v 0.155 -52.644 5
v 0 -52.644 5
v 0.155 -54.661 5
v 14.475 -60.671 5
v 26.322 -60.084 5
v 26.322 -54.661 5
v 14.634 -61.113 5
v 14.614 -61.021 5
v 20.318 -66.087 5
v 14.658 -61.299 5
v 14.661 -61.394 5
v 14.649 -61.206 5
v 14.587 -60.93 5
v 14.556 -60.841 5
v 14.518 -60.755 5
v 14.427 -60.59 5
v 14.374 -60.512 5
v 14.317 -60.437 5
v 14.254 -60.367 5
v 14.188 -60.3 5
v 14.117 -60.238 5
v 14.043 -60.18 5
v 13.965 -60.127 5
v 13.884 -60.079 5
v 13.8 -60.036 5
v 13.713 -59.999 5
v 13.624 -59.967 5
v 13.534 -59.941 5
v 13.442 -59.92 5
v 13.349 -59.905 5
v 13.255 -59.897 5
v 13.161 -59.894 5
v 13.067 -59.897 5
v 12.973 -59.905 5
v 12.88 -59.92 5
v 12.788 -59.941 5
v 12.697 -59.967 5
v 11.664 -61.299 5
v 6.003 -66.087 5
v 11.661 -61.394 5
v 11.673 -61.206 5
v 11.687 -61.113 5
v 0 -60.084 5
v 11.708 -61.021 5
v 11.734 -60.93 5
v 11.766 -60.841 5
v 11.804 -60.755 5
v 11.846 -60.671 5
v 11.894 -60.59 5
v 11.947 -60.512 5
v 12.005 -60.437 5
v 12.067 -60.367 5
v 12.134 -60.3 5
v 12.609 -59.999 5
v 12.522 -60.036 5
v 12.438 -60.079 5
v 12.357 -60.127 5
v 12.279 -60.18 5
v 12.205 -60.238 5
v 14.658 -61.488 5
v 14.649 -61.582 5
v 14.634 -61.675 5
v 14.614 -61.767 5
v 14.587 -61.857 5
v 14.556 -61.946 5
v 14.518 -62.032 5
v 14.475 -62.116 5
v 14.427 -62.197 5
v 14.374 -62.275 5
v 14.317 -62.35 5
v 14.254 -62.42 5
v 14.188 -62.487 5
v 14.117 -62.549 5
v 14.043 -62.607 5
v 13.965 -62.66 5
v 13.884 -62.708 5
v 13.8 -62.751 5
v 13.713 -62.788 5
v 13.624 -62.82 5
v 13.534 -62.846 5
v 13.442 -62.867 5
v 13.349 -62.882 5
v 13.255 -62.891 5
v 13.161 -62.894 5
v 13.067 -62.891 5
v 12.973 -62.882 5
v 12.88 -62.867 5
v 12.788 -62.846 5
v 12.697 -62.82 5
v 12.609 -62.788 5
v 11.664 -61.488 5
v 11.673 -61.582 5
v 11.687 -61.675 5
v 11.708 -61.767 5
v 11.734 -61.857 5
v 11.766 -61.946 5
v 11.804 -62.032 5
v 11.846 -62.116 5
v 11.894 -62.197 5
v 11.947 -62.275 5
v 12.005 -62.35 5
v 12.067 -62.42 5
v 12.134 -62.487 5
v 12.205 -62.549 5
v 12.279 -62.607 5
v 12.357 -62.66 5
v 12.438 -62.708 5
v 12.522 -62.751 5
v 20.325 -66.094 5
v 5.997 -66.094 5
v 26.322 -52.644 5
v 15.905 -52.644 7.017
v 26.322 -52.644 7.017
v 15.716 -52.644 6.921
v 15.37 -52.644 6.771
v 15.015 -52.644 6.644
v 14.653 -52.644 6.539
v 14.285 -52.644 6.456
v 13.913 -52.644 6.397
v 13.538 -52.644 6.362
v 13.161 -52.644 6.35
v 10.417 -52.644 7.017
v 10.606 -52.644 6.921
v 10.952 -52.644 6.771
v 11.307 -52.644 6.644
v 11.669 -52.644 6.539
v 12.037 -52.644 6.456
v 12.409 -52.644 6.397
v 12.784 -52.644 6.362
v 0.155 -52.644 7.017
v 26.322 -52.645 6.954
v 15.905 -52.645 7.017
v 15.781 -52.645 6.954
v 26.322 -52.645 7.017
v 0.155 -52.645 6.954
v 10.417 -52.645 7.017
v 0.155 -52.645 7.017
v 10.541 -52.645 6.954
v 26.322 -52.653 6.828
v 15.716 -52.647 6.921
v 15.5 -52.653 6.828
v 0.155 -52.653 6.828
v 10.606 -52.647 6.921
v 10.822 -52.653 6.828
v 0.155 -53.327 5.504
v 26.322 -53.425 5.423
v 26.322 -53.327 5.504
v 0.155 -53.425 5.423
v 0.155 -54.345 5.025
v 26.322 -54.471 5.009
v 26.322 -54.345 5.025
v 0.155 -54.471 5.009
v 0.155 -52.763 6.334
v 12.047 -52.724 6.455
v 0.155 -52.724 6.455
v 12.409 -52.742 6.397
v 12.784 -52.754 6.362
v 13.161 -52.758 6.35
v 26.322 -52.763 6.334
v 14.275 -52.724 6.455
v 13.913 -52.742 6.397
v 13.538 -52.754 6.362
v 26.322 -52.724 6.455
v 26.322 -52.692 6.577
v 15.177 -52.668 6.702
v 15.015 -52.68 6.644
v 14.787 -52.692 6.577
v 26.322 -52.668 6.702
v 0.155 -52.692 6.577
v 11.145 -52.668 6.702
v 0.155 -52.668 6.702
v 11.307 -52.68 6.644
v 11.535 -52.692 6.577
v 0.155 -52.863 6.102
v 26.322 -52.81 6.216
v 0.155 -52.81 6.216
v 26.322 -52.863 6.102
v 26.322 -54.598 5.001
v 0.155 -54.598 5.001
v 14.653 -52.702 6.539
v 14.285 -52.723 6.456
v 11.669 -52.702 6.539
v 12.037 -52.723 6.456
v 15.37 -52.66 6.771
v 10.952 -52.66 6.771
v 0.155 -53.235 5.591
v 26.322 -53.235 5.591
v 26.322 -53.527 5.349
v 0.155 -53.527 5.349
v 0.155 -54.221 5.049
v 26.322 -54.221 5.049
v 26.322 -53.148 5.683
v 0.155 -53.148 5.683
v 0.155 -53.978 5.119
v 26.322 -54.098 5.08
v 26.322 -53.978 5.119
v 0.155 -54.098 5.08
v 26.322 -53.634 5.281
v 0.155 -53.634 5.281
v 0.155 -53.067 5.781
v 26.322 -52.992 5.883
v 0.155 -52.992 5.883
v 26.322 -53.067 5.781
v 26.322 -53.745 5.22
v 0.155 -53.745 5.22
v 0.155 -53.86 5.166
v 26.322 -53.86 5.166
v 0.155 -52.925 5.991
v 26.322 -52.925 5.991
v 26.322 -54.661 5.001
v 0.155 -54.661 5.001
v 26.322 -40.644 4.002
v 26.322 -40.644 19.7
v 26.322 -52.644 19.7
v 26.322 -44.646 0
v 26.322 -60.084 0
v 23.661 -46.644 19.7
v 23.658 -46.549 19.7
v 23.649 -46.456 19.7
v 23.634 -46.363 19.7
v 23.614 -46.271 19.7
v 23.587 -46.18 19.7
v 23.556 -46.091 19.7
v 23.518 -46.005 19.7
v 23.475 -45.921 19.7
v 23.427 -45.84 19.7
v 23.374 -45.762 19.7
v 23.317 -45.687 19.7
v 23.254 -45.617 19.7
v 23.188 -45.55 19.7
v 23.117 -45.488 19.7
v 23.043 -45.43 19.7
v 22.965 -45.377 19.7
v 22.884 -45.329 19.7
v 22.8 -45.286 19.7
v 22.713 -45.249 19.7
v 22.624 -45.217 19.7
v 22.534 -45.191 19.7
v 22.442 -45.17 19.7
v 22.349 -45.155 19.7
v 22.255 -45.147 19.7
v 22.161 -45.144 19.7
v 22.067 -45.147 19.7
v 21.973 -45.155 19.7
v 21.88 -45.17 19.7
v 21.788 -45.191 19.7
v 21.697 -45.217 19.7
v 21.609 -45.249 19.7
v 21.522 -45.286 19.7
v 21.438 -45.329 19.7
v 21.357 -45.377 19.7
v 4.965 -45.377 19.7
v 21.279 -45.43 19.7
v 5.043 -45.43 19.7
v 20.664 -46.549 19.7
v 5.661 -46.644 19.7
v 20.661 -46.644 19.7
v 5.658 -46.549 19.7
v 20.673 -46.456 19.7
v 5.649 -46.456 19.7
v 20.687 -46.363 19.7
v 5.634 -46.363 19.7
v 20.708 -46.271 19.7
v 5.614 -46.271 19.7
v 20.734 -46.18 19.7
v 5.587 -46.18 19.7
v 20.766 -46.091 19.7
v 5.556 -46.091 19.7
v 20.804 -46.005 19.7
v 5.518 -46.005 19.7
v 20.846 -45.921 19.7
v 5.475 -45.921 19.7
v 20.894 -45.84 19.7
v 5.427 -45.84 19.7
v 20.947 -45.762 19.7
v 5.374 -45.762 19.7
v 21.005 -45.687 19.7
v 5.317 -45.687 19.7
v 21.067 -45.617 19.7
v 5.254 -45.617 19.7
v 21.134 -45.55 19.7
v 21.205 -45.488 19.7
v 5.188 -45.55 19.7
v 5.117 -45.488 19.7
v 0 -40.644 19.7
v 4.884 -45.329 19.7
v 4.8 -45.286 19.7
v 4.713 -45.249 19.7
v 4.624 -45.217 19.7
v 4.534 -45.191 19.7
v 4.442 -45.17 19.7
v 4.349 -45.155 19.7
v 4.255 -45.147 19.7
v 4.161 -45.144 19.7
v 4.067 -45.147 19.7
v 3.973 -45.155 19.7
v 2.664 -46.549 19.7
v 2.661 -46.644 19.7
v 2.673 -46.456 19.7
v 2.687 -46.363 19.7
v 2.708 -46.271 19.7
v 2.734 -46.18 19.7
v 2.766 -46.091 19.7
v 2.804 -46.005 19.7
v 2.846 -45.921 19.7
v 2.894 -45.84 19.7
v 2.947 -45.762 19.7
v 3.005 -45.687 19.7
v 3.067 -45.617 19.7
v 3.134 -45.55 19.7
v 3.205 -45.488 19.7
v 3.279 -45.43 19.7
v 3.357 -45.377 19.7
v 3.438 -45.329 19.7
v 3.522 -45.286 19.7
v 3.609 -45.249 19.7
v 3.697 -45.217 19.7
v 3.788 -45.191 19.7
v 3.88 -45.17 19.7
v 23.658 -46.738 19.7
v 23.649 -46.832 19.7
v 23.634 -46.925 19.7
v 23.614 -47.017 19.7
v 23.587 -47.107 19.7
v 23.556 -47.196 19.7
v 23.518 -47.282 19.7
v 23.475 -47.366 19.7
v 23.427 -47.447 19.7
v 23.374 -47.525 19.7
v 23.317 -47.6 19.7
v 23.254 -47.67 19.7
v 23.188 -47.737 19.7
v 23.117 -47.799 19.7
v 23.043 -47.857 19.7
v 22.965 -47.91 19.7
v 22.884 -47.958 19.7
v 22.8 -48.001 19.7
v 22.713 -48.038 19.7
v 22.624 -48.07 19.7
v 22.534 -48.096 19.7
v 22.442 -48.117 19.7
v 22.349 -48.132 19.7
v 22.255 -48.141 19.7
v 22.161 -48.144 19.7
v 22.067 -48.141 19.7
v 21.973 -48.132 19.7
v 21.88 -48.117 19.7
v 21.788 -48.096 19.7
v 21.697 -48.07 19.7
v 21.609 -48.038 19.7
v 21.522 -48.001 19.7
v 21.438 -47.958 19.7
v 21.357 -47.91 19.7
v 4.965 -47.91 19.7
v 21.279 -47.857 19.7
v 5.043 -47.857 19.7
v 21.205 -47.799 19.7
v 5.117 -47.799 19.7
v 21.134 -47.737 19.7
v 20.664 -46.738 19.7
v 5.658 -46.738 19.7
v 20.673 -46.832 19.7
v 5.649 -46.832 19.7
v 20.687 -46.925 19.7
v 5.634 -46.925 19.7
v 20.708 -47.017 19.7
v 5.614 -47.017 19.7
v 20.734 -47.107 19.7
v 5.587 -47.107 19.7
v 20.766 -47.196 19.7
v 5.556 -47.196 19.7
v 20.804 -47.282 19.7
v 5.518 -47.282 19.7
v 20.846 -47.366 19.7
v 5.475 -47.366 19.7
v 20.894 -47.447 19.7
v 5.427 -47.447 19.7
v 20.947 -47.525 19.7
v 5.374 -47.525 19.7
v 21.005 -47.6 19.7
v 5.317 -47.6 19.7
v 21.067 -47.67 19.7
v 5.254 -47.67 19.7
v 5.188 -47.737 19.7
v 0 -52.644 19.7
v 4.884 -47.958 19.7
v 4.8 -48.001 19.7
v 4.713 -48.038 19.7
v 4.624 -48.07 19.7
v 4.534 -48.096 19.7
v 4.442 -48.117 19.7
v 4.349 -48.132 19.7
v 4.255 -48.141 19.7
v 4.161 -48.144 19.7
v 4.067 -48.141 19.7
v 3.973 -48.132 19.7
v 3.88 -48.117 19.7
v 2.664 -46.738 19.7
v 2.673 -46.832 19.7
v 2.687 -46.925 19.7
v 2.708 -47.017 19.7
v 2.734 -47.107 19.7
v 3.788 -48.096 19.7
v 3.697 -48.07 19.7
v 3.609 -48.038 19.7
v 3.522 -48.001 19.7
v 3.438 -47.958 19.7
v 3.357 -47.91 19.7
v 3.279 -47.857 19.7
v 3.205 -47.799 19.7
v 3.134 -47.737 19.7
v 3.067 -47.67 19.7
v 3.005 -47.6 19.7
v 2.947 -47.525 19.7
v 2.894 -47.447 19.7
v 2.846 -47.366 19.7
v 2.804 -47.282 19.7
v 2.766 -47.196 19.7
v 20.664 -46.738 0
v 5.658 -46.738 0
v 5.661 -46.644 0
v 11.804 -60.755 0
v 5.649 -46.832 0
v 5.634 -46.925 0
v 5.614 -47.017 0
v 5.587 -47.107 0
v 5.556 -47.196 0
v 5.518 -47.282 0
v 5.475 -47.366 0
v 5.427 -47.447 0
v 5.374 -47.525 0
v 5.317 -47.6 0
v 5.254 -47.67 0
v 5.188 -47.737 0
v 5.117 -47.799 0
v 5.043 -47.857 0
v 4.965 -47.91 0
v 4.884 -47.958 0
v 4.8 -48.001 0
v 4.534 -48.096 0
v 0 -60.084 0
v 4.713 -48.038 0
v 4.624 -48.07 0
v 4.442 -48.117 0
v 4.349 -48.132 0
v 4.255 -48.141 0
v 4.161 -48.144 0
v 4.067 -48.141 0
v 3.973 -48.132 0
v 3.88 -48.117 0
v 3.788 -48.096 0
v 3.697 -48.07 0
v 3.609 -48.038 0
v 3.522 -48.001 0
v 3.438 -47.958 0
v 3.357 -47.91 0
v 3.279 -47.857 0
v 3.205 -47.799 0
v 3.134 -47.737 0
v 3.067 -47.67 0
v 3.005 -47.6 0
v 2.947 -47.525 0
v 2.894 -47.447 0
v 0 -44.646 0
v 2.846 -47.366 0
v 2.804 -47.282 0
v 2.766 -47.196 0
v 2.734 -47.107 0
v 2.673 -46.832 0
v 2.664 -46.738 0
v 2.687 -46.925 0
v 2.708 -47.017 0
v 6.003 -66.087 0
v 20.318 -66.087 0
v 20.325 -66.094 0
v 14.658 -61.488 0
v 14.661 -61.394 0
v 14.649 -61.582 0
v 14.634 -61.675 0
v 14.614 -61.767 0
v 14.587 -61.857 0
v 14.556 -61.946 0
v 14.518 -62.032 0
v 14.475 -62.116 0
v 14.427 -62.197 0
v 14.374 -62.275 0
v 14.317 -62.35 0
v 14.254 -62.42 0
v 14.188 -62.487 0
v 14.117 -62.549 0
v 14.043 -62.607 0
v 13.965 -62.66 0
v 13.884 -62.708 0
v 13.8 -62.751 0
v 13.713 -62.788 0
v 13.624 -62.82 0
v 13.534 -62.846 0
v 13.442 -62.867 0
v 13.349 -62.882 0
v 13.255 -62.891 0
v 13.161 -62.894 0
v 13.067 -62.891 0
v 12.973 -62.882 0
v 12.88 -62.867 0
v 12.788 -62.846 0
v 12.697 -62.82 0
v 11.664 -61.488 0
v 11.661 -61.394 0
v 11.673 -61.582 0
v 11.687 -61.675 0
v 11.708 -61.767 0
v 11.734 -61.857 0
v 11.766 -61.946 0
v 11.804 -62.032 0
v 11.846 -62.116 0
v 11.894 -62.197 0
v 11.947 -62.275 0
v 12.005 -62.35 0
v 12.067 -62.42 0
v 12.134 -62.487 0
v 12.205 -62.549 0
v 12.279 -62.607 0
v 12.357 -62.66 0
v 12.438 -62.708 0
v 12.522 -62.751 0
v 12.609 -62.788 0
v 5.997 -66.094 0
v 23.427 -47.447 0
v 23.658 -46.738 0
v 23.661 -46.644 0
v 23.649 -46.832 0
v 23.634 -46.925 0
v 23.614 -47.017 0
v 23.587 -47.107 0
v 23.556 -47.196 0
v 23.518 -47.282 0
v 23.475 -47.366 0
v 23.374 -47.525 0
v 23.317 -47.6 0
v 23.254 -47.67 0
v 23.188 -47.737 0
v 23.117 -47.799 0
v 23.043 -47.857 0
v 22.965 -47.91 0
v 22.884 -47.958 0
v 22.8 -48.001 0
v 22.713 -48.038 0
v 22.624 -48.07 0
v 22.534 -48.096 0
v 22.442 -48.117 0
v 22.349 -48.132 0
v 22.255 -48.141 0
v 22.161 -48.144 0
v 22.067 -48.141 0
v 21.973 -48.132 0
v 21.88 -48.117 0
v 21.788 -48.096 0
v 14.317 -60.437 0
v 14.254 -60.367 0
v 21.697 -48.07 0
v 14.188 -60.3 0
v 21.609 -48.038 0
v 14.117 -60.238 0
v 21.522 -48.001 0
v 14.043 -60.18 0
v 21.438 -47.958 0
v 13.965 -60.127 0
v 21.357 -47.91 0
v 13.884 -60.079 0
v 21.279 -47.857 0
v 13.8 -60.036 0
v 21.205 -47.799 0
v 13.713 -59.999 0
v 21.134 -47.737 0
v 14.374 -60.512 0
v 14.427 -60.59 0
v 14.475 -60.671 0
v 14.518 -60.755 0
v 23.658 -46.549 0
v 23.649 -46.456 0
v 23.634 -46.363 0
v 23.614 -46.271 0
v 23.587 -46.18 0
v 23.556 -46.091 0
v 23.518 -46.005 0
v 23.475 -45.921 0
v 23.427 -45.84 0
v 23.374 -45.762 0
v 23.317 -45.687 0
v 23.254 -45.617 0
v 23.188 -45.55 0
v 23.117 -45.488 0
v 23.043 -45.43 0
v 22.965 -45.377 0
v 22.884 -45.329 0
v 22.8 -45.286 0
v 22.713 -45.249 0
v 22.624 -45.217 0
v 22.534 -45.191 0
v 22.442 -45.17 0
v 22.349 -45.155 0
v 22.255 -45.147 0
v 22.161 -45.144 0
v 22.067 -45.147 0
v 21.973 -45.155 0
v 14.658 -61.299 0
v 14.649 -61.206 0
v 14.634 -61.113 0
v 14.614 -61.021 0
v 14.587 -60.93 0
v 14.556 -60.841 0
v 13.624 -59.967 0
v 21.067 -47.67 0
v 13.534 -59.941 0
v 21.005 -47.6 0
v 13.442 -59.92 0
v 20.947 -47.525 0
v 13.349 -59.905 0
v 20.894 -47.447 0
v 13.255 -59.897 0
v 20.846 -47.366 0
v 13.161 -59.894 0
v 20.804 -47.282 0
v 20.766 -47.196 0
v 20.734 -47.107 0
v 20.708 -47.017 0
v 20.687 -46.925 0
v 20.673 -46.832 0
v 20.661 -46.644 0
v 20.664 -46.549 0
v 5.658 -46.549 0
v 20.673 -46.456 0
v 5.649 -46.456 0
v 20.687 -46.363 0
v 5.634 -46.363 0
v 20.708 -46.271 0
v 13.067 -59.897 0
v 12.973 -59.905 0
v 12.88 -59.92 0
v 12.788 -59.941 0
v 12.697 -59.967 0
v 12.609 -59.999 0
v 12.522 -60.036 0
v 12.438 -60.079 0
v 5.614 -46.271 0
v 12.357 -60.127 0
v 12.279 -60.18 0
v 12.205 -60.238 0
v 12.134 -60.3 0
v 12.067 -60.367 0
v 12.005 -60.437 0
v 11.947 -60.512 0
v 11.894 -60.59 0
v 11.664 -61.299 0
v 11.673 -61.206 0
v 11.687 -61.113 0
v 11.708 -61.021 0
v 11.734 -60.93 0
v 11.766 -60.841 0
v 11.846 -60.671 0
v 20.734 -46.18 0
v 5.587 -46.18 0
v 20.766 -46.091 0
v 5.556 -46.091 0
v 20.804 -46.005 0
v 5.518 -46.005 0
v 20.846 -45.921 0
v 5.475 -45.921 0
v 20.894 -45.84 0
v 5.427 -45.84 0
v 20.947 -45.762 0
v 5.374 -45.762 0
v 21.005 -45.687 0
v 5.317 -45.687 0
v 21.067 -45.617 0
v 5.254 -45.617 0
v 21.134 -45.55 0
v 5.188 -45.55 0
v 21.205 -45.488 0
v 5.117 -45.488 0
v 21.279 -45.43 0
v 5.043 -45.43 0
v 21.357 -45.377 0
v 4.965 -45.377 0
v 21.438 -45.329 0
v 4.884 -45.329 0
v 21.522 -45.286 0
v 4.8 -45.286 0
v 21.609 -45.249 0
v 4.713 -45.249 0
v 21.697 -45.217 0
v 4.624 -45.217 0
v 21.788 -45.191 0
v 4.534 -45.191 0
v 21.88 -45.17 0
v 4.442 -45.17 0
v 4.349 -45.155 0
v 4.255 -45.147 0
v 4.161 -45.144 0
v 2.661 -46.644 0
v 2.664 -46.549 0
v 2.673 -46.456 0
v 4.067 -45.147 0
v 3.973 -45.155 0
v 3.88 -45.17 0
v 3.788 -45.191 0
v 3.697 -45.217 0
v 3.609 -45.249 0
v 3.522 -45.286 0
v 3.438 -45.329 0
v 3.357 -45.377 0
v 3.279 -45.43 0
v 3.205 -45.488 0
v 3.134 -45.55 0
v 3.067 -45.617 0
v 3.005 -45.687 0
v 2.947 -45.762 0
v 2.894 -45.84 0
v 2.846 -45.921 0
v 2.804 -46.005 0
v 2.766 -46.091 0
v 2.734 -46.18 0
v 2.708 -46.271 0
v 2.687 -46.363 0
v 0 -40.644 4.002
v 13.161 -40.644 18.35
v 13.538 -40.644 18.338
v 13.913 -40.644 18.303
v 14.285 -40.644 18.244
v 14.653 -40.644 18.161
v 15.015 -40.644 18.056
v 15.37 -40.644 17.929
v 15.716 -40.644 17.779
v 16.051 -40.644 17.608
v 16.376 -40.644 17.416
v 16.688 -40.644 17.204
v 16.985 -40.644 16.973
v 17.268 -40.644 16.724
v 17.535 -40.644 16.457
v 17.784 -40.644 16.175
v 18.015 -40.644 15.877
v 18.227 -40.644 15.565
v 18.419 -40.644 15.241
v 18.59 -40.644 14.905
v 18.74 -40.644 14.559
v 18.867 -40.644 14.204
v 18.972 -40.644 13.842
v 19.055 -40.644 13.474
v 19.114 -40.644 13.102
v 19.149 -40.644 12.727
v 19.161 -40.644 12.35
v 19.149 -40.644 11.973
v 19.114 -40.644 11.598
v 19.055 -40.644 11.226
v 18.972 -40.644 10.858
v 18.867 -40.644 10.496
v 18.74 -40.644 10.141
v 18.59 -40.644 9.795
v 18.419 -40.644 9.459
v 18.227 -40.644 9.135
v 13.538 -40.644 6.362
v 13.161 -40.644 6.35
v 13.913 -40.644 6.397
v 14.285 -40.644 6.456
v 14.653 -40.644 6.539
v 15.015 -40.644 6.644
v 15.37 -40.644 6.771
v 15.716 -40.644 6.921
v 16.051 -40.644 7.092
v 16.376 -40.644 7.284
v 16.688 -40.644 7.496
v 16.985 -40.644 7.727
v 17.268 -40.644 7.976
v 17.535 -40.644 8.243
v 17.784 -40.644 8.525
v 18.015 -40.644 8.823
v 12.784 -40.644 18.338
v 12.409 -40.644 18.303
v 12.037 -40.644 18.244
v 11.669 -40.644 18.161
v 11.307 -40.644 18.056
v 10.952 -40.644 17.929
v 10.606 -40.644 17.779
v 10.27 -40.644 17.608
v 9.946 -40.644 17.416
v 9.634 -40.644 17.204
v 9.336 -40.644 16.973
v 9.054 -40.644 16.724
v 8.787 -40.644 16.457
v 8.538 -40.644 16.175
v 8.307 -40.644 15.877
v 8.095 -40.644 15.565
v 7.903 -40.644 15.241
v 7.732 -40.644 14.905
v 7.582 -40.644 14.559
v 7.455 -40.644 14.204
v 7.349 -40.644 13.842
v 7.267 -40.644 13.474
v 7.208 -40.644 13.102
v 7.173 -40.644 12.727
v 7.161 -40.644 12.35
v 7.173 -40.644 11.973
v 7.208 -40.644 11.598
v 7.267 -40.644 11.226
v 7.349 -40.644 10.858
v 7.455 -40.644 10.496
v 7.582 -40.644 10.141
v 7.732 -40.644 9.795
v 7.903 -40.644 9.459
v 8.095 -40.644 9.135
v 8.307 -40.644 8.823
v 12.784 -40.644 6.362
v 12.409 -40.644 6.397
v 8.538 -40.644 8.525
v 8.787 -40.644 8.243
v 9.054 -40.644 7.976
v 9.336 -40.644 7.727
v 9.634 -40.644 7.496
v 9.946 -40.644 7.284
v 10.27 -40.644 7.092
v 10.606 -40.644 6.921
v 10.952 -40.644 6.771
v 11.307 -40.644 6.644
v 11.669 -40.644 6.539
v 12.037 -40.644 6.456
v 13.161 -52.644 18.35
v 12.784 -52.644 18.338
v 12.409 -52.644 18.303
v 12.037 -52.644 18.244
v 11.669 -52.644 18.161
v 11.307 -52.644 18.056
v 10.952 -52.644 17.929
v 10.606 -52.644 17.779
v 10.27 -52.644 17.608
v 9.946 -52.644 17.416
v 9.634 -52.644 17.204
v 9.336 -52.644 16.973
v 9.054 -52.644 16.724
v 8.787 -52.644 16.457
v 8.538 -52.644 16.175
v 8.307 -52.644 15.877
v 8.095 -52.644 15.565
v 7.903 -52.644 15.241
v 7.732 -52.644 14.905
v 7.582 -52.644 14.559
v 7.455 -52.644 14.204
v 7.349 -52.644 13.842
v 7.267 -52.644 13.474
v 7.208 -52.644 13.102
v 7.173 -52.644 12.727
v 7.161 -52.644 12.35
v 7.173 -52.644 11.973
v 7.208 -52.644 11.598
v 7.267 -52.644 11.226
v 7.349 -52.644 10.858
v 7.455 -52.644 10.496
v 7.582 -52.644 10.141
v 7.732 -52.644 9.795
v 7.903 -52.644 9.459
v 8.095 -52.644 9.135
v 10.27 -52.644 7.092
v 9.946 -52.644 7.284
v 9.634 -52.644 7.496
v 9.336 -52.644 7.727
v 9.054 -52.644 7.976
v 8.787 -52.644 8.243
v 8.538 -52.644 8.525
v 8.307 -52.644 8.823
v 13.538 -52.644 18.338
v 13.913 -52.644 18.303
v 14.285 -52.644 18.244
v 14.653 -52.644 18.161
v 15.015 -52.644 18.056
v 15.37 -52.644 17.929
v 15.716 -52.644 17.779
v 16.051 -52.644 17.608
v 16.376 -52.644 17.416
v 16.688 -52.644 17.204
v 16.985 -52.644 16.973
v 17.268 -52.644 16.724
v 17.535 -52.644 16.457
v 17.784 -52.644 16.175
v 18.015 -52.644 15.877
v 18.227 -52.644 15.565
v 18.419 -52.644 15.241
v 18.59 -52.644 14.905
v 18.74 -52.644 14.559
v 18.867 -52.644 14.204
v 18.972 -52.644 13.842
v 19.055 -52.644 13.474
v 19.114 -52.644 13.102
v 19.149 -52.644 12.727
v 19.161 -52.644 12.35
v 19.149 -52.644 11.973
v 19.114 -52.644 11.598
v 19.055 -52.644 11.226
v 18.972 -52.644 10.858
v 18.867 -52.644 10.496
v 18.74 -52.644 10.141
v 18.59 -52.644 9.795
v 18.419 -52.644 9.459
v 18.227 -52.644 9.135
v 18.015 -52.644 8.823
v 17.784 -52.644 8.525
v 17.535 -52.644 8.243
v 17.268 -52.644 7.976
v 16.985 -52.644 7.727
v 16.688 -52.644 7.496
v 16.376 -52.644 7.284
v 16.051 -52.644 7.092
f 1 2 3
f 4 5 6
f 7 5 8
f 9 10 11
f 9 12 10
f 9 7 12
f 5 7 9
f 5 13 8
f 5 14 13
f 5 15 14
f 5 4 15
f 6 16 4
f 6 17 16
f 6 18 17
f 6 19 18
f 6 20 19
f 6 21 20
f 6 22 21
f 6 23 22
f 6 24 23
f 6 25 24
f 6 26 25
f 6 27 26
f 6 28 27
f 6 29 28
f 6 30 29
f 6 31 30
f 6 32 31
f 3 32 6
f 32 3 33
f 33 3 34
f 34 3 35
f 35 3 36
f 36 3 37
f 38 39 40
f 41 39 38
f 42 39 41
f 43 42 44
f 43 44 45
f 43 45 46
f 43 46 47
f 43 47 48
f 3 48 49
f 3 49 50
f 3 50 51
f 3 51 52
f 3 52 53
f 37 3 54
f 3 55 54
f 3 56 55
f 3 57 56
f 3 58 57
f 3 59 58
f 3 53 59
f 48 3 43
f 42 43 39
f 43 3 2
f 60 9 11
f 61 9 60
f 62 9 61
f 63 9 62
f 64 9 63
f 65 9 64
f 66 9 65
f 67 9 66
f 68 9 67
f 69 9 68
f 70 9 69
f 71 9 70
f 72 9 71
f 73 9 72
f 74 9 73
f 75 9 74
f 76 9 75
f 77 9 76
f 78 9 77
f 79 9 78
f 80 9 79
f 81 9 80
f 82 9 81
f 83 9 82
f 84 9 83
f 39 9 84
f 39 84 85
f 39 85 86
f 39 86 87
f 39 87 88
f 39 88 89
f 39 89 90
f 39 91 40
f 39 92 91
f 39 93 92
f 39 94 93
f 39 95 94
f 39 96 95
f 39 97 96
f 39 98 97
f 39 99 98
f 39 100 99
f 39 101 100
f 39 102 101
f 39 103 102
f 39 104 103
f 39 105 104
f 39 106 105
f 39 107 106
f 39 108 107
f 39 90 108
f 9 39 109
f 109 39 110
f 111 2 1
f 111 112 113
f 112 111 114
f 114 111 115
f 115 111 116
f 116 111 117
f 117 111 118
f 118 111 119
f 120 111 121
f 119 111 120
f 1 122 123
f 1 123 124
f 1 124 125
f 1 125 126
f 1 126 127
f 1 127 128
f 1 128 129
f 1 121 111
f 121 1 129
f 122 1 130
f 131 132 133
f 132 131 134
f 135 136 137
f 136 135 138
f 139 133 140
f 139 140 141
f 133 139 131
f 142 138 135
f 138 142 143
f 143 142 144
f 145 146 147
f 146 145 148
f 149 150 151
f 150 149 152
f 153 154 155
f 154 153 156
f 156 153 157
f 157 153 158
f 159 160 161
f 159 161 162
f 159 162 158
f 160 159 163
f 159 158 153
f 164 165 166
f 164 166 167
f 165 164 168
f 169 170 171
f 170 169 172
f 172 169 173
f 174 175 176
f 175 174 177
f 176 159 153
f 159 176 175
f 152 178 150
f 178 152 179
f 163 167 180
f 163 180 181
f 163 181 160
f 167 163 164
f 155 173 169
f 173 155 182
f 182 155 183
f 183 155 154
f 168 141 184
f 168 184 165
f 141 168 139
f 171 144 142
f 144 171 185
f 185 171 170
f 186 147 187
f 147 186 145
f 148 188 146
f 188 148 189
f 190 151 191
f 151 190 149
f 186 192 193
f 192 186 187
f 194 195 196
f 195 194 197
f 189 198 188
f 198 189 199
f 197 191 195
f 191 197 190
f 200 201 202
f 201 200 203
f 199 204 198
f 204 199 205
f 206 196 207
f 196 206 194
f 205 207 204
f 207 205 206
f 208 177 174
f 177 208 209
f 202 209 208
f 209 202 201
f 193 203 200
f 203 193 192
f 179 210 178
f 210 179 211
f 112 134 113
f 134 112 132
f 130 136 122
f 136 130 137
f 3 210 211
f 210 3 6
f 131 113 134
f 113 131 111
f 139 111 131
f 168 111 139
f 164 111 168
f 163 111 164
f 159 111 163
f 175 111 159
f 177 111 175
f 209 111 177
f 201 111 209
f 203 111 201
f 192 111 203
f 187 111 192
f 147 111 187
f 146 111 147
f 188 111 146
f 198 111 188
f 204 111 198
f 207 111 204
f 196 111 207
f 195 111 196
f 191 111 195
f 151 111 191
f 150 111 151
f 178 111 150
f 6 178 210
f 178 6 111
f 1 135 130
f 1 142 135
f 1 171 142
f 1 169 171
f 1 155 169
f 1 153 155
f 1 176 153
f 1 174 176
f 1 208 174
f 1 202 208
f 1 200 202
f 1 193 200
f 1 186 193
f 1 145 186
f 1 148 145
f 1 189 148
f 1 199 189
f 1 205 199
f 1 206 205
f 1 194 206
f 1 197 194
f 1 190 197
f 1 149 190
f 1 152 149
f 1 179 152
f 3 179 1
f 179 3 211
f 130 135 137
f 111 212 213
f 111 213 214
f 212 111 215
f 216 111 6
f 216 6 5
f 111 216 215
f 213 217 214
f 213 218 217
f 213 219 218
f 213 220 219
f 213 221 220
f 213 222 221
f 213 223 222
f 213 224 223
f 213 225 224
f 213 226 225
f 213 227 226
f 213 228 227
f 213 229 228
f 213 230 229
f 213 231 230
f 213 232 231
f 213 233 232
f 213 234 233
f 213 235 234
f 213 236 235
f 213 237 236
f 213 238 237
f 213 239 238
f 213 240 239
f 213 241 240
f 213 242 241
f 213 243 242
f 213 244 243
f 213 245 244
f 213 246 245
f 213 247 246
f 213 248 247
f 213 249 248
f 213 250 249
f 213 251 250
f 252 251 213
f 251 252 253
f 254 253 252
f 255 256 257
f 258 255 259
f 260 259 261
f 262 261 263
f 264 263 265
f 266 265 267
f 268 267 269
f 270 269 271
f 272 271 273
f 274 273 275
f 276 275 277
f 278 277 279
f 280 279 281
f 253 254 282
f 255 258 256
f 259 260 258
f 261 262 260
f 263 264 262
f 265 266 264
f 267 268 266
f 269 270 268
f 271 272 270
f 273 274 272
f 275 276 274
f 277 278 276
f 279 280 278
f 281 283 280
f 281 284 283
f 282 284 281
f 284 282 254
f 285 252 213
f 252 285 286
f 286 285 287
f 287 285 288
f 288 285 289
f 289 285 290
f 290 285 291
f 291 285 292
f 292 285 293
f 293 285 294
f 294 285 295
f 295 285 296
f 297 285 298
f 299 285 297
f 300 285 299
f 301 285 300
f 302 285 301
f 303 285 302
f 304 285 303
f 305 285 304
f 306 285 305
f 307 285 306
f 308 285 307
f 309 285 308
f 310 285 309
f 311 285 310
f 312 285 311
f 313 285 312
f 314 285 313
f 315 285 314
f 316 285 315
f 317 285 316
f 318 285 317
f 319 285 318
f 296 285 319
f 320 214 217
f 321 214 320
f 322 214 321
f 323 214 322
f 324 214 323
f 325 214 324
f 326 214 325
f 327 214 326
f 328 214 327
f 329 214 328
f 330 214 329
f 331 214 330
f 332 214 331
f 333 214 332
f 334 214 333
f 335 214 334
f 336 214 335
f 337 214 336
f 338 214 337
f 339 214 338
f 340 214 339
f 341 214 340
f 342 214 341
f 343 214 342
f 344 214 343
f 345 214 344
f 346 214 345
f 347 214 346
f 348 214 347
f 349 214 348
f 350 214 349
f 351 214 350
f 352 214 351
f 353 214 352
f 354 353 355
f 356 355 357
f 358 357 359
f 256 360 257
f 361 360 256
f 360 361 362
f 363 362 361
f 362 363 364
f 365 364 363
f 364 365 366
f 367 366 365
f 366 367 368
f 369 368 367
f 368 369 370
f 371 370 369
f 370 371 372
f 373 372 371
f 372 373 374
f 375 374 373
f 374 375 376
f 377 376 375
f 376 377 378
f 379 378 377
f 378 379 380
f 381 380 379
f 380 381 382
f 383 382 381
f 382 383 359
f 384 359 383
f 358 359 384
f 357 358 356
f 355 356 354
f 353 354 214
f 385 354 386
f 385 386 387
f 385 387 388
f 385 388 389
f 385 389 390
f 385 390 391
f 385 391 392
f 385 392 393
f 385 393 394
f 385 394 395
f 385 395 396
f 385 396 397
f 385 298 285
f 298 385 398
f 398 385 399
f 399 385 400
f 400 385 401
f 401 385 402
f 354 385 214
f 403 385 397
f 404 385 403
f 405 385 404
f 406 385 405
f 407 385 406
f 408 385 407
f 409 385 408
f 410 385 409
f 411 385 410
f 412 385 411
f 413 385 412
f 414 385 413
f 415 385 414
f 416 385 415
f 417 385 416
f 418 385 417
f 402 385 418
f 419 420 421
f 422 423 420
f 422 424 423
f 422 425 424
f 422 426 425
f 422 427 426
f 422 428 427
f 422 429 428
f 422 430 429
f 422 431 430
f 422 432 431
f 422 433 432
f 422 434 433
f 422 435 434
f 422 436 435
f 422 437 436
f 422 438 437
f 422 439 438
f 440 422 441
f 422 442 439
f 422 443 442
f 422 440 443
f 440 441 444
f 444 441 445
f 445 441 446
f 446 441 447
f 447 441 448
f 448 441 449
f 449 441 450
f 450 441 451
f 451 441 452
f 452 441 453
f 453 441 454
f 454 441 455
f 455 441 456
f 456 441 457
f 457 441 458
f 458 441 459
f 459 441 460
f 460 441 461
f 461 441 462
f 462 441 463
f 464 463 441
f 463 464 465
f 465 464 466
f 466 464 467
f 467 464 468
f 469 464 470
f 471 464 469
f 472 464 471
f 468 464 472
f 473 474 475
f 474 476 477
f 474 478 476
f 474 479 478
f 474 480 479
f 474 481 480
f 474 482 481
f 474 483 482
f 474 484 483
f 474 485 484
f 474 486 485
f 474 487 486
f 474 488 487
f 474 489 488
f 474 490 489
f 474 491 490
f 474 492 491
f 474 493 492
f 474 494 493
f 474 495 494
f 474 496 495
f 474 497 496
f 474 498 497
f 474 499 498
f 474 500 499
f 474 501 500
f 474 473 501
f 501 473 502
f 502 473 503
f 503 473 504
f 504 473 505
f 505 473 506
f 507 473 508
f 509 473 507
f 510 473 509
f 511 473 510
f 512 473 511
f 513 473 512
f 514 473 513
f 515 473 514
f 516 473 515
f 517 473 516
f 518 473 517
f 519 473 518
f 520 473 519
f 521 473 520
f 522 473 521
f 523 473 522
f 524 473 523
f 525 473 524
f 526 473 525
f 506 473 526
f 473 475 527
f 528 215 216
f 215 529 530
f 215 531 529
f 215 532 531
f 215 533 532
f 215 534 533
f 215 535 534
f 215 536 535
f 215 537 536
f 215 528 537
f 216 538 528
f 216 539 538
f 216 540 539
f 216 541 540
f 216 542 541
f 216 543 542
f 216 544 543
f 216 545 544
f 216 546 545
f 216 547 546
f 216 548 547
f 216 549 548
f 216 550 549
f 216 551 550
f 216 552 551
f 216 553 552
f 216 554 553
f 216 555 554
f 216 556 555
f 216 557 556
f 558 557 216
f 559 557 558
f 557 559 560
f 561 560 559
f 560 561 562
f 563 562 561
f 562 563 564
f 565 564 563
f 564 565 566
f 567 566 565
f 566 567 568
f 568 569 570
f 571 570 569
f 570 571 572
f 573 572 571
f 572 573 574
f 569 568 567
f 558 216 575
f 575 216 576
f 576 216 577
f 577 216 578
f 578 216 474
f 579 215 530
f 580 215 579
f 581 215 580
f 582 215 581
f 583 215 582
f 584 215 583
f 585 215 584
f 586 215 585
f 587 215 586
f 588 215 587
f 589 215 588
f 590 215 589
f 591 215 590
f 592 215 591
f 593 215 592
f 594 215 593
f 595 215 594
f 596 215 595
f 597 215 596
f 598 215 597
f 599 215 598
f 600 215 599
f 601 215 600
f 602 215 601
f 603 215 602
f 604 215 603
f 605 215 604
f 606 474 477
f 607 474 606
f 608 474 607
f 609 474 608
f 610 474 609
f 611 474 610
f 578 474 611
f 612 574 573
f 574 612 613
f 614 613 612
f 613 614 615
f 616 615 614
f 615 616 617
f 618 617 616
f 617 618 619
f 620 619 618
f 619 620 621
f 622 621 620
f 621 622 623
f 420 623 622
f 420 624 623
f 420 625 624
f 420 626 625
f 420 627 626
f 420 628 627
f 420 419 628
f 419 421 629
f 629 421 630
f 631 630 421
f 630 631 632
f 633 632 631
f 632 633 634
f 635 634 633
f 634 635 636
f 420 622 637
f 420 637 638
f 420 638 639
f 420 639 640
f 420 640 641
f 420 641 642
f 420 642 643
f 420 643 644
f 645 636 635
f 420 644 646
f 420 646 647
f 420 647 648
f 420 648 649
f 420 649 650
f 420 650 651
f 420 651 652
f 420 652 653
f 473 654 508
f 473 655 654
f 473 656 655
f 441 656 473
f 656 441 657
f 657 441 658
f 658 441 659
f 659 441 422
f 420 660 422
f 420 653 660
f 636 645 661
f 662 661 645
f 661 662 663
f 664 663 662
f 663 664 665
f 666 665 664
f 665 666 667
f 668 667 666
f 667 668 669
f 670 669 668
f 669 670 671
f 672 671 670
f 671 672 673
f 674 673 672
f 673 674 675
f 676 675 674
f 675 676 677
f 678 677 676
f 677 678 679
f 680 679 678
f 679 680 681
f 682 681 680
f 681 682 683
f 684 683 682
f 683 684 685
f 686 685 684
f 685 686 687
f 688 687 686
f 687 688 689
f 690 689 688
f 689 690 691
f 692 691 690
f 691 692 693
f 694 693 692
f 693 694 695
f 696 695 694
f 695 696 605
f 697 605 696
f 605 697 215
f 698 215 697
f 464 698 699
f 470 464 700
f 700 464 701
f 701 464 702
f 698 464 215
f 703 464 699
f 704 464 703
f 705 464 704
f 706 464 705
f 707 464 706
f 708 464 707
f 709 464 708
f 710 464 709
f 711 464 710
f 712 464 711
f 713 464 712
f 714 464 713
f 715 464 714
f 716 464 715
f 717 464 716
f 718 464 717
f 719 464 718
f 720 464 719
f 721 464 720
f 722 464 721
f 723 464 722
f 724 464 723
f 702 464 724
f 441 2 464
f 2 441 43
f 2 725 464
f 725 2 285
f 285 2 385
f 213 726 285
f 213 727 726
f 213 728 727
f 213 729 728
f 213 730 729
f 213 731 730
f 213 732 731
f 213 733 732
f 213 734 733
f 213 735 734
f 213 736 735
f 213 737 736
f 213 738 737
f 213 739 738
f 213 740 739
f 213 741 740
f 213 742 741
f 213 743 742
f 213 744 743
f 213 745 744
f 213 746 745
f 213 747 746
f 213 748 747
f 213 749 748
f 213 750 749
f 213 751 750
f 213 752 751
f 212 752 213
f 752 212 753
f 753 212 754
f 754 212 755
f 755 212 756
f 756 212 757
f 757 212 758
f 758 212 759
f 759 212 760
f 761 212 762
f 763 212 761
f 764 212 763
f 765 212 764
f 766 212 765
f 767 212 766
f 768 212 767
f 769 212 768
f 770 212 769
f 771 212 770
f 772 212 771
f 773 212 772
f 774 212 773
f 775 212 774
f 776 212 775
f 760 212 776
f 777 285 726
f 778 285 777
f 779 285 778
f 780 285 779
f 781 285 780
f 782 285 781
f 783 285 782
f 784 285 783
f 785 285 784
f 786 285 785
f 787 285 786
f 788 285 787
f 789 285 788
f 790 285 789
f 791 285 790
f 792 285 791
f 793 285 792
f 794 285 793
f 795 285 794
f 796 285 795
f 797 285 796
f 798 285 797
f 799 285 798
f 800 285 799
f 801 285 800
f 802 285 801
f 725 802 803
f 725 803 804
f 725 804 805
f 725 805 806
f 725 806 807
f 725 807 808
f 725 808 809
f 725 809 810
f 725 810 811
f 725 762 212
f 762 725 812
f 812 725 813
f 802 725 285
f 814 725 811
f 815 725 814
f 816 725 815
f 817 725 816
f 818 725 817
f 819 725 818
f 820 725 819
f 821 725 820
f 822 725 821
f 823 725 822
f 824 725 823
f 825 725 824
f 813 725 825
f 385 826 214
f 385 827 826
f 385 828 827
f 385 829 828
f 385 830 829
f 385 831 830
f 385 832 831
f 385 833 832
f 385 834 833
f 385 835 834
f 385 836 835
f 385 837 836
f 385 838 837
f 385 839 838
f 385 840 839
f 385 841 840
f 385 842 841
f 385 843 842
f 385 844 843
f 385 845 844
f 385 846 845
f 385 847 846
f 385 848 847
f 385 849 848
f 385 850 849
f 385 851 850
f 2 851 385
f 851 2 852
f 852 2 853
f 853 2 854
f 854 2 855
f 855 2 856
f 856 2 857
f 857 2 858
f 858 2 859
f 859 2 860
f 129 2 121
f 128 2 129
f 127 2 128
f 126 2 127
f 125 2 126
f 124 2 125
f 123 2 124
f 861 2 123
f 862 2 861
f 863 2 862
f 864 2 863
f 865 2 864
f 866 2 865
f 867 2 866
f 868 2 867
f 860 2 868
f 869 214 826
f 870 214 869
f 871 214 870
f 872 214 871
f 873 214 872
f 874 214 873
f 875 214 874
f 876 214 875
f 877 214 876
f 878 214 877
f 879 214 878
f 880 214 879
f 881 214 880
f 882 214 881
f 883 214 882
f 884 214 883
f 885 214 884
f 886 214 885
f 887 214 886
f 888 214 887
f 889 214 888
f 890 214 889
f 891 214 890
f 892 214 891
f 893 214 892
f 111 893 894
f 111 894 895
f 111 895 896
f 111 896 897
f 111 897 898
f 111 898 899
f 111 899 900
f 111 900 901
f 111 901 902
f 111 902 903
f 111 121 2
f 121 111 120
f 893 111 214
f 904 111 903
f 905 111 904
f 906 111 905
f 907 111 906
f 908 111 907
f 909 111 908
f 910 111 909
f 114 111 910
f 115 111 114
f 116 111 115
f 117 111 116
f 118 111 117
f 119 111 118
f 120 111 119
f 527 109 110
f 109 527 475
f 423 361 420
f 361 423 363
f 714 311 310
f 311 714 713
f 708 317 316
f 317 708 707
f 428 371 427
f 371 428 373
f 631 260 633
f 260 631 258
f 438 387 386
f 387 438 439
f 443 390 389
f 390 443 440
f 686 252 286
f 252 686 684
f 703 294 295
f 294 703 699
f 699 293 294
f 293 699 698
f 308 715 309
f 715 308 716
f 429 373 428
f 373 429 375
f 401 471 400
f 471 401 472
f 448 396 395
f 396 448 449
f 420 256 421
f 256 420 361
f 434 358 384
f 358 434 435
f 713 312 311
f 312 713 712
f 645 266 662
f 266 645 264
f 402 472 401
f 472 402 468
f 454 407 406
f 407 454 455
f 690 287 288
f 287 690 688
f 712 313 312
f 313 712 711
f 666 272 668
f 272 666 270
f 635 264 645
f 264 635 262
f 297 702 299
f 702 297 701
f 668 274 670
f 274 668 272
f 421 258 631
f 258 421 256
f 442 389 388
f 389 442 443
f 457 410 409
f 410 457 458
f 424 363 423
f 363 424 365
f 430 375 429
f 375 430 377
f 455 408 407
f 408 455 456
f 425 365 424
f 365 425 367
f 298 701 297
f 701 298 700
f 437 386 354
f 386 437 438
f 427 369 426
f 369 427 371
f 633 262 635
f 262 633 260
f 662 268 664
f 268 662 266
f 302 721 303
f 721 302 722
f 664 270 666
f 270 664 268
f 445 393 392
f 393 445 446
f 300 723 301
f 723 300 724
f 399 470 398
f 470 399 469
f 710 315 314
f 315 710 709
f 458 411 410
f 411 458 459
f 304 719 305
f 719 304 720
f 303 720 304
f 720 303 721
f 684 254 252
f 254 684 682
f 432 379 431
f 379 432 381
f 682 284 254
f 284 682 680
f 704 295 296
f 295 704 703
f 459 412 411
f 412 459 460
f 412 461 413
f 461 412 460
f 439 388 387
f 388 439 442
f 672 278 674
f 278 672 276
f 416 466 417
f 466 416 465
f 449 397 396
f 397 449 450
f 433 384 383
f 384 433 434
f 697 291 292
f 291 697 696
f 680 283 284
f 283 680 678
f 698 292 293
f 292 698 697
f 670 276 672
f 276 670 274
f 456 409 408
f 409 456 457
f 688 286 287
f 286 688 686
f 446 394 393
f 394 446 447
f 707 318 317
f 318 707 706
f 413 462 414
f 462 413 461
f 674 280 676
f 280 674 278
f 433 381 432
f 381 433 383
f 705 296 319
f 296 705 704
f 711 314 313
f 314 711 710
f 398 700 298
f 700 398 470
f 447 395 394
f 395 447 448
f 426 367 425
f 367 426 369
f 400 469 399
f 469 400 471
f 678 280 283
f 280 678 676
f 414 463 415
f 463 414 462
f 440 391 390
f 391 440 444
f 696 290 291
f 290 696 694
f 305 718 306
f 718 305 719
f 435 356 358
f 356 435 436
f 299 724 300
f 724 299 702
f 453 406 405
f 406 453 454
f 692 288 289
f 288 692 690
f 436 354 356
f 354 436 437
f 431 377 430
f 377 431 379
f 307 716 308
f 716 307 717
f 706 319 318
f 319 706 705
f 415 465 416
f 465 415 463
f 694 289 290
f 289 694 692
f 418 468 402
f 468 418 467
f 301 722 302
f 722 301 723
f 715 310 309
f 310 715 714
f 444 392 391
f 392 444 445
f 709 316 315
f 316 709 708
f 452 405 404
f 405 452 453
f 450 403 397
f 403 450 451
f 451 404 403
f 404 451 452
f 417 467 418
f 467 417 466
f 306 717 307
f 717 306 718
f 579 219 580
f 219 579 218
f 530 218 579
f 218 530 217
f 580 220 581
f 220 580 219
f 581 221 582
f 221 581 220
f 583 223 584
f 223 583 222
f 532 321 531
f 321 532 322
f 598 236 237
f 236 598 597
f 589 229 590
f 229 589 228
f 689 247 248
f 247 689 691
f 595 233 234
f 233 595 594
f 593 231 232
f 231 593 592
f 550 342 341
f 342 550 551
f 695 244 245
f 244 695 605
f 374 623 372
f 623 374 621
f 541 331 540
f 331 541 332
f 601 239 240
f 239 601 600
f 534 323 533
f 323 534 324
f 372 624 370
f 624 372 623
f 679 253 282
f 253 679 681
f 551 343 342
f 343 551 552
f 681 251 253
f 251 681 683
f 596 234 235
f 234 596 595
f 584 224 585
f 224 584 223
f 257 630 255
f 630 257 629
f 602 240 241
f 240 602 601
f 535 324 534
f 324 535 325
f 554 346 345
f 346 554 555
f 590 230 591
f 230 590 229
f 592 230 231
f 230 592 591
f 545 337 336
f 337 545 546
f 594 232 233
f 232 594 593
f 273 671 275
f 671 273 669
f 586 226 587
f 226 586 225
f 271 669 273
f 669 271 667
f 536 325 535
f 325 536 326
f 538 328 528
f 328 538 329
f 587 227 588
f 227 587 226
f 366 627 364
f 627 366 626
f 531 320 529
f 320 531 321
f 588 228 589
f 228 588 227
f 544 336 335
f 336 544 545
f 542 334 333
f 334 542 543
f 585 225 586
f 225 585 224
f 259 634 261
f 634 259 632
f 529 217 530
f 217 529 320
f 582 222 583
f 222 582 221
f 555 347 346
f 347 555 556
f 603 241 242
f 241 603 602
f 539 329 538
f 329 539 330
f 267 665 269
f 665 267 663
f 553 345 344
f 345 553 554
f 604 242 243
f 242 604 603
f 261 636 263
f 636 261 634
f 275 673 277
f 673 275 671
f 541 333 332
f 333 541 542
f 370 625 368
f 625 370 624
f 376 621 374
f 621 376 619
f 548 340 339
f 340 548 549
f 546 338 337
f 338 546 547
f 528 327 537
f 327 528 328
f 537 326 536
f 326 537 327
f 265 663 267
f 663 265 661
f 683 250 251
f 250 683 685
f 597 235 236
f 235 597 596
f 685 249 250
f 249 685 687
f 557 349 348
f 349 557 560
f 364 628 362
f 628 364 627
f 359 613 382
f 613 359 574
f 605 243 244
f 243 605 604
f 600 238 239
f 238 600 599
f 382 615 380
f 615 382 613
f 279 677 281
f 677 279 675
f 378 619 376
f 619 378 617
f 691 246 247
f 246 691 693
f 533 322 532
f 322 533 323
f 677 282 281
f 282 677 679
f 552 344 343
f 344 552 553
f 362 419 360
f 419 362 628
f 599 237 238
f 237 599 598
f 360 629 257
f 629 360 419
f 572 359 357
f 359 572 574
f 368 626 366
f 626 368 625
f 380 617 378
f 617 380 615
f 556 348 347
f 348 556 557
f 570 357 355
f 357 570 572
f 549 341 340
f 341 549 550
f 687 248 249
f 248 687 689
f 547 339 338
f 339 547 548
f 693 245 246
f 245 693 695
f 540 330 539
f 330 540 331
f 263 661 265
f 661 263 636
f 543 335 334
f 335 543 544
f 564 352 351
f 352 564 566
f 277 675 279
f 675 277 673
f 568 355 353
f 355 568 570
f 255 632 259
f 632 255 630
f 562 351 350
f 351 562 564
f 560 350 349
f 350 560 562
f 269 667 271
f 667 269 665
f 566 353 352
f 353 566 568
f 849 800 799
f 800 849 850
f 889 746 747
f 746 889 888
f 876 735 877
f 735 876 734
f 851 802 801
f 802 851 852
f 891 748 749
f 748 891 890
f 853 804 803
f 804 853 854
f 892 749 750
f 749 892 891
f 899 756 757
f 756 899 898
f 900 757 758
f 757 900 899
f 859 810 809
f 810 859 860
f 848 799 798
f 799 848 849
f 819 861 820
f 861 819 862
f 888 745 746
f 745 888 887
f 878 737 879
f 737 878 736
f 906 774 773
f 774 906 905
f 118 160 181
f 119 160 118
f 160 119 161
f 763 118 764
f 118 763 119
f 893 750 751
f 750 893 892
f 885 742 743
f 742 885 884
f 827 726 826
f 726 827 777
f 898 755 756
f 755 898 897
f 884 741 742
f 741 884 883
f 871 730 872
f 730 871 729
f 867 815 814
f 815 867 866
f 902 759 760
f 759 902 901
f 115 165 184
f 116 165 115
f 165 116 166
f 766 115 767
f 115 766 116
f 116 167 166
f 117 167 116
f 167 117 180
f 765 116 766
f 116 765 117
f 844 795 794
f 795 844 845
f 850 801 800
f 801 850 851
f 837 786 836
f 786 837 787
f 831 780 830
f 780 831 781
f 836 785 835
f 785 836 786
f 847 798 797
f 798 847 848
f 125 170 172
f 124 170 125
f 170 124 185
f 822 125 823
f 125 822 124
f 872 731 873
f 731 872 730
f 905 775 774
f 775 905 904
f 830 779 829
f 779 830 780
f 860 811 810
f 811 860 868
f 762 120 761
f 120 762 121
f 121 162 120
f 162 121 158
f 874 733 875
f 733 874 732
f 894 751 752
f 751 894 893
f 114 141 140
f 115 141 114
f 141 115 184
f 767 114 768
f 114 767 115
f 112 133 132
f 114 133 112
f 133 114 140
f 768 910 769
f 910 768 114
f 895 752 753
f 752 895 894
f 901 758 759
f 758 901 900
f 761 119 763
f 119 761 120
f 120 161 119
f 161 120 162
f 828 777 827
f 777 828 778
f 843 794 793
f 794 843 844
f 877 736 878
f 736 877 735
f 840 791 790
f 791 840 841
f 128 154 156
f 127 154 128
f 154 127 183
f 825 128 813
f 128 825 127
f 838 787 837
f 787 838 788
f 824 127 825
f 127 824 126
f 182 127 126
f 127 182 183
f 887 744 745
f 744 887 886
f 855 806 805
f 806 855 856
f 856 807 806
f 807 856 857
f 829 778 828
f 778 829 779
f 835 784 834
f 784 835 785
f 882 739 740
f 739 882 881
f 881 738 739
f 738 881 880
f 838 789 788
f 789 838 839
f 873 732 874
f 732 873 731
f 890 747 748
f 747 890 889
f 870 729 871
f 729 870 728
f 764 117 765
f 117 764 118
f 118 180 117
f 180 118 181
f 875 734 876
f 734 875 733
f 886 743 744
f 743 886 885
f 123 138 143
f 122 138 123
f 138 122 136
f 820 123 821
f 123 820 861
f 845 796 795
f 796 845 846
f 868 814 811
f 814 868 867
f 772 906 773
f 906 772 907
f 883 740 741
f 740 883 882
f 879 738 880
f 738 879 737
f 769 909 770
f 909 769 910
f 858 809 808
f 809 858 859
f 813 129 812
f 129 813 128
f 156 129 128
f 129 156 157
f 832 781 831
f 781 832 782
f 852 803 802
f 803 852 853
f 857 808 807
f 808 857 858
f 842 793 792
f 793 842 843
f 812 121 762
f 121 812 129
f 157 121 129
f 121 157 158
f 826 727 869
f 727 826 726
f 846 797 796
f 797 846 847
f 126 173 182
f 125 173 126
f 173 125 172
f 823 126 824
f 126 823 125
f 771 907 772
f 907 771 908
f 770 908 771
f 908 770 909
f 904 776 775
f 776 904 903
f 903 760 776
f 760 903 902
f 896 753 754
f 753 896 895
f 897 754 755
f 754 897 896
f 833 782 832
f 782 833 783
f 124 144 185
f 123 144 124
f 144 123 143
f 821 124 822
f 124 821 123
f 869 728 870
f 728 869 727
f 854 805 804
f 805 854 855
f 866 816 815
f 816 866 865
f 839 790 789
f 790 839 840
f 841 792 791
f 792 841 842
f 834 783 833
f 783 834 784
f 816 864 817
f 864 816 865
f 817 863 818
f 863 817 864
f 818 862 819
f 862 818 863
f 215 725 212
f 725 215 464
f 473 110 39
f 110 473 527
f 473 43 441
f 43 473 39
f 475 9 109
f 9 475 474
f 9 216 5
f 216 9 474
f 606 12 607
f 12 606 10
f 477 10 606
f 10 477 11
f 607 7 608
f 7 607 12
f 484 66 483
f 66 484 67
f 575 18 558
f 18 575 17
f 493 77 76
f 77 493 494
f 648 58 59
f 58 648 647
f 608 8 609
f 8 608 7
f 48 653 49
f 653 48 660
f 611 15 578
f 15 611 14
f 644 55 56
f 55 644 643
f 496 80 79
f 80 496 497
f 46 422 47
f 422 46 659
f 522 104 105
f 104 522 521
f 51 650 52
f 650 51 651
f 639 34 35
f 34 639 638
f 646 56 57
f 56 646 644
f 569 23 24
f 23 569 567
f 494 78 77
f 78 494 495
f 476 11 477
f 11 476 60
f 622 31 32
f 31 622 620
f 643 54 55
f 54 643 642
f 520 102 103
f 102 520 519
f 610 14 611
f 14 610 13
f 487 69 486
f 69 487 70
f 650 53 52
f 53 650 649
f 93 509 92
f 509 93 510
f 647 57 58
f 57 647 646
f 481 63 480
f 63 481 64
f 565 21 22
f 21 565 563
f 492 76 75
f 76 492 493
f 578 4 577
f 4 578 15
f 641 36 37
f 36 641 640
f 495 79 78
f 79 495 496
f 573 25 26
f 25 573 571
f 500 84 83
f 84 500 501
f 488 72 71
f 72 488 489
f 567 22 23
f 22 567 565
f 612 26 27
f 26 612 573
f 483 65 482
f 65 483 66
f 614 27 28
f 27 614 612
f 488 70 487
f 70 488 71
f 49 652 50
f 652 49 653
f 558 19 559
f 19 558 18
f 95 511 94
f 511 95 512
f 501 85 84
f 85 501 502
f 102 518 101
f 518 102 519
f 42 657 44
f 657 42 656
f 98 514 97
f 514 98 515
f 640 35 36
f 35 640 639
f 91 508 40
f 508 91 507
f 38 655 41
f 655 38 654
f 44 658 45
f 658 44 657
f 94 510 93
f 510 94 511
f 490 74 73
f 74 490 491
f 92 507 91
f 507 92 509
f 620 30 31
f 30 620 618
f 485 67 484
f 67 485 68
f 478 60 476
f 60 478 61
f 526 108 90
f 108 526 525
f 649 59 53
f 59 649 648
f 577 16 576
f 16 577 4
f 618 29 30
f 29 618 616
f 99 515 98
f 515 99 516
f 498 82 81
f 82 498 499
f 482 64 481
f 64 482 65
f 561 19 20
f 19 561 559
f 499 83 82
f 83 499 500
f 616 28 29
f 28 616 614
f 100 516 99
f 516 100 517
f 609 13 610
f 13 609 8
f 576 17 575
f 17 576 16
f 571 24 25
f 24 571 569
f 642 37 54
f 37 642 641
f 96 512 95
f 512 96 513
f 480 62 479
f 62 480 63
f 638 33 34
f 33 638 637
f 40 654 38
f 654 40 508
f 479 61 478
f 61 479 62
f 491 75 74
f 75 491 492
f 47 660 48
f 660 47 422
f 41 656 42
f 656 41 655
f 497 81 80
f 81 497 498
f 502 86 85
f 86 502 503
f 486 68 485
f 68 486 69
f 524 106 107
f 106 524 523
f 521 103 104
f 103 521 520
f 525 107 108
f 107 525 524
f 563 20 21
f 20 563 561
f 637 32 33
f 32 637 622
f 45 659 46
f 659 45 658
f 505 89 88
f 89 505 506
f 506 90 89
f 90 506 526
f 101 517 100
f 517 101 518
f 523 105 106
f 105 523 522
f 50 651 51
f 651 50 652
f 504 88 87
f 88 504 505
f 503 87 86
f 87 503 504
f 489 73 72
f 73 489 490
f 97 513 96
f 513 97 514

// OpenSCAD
use <../../../smooth_prim.scad>

blTouchAdapterWidth = 26.3218;
blTouchAdapterDepth = 25.45;
blTouchAdapterHeight = 19.7;
blTouchAdapterTopWidth = 12;
blTouchAdapterBottomWidth = blTouchAdapterWidth - blTouchAdapterTopWidth;
blTouchAdapterBottomHeight = 5;
blTouchAdapterFromBackToCutCorner = 19;
blTouchAdapterBottomCenterSectionLength = 14.5;
blTouchAdapterMainHoleDiameter = 12;
blTouchAdapterBottomHoleDiameter = 3;
blTouchAdapterTopHolesDiameter = 3;
blTouchAdapterTopHolesDistanceFromEdge = 4;
blTouchAdapterBottomHoleDistanceFromEdge = 3.2;
blTouchAdapterCutBottomToCutCorner = 15;
blTouchAdapterCutBottomLength = 5.66;
blTouchAdapterBottomCutCornerLength = 8.49;
blTouchDistanceBetweenTwoHoles = 18;

union() {
    //projection() import("Eryone_thinker_BLtouch_mounting_plates.STL");
    //projection() rotate([- 90, 0, 0]) translate([- 40, 0, 0]) import("Eryone_thinker_BLtouch_mounting_plates.STL");
    //translate([- 40, - 40, 0]) import("Eryone_thinker_BLtouch_mounting_plates.STL");
    translate([0, - 2 * blTouchAdapterWidth, 0])
        difference() {
            union() {
                difference() {
                    union() {
                        cube(size = [blTouchAdapterWidth, blTouchAdapterTopWidth, blTouchAdapterHeight]);
                        bottom();
                        chamfer();
                    }
                    // The main hole
                    color("black")
                        translate([(blTouchAdapterWidth - blTouchAdapterMainHoleDiameter) / 2, blTouchAdapterTopWidth *
                            .75,
                                blTouchAdapterBottomHeight + ((blTouchAdapterHeight - blTouchAdapterBottomHeight) -
                                blTouchAdapterMainHoleDiameter) / 2
                            ])
                            translate([blTouchAdapterMainHoleDiameter / 2, blTouchAdapterMainHoleDiameter / 2,
                                    blTouchAdapterMainHoleDiameter / 2])
                                rotate([90, 0, 0])
                                    cylinder(d = blTouchAdapterMainHoleDiameter, h = blTouchAdapterTopWidth * 1.5, $fn =
                                    100
                                    );
                    topHoles();
                    bottomCut();
                }
            }
            bottomHole();
            bottomCornerCut();
        }
}

module topHoles() {
    // The top holes
    color("black")
        union() {
            translate([(blTouchAdapterWidth - blTouchDistanceBetweenTwoHoles) / 2 - blTouchAdapterTopHolesDiameter / 2,
                        blTouchAdapterTopWidth / 2 - blTouchAdapterTopHolesDiameter / 2, -
                blTouchAdapterTopHolesDiameter])
                translate([blTouchAdapterTopHolesDiameter / 2, blTouchAdapterTopHolesDiameter / 2, 0])
                    cylinder(d = blTouchAdapterTopHolesDiameter, h = blTouchAdapterHeight * 1.5, $fn = 100);
            translate([blTouchAdapterWidth - (blTouchAdapterWidth - blTouchDistanceBetweenTwoHoles) / 2 -
                    blTouchAdapterTopHolesDiameter / 2, blTouchAdapterTopWidth / 2 - blTouchAdapterTopHolesDiameter / 2,
                -
                blTouchAdapterTopHolesDiameter])
                translate([blTouchAdapterTopHolesDiameter / 2, blTouchAdapterTopHolesDiameter / 2, 0])
                    cylinder(d = blTouchAdapterTopHolesDiameter, h = blTouchAdapterHeight * 1.5, $fn = 100);
        }
}

module bottomHole() {
    // The top holes
    color("white")
        union() {
            translate([blTouchAdapterWidth / 2 - blTouchAdapterBottomHoleDiameter / 2, - (blTouchAdapterDepth -
                blTouchAdapterTopWidth) + blTouchAdapterBottomHoleDistanceFromEdge, - 1])
                translate([blTouchAdapterBottomHoleDiameter / 2, blTouchAdapterBottomHoleDiameter / 2, 0])
                    cylinder(d = blTouchAdapterBottomHoleDiameter, h = blTouchAdapterHeight * 1.5, $fn = 100);
        }
}

module bottom() {
    // The bottom
    color("red")
        translate([0, - (blTouchAdapterDepth - blTouchAdapterTopWidth), 0])
            cube(size = [blTouchAdapterWidth, blTouchAdapterBottomWidth, blTouchAdapterBottomHeight]);
}

module bottomCut() {
    color("blue")
        translate([- blTouchAdapterWidth * .25, blTouchAdapterTopWidth, - sqrt(2 * blTouchAdapterCutBottomLength^2) / 2]
        )
            rotate([45, 0, 0])
                cube(size = [blTouchAdapterWidth * 1.5, blTouchAdapterCutBottomLength, blTouchAdapterCutBottomLength]);
}

module bottomCornerCut() {
    color("green")
        translate([0, 0, - 1])
            translate([0, sqrt(2 * blTouchAdapterBottomCutCornerLength^2) / 2 - blTouchAdapterDepth, 0])
                union() {
                    rotate([0, 0, 45])
                        cube(size = [blTouchAdapterBottomCutCornerLength, blTouchAdapterBottomCutCornerLength,
                                blTouchAdapterHeight
                                *
                                1.5]);
                    translate([blTouchAdapterWidth, 0, 0])
                        rotate([0, 0, 45])
                            cube(size = [blTouchAdapterBottomCutCornerLength, blTouchAdapterBottomCutCornerLength,
                                    blTouchAdapterHeight
                                    *
                                    1.5]);
                }
}

module chamfer() {
    cubeSide = blTouchAdapterDepth - blTouchAdapterTopWidth;
    smoothinRadius = 0.15 * cubeSide;
    color("blue")
        translate([- blTouchAdapterWidth * .25, - cubeSide, blTouchAdapterBottomHeight])
            difference() {
                cube(size = [blTouchAdapterWidth * 1.5, cubeSide, cubeSide]);
                SmoothCube(size = [blTouchAdapterWidth * 1.5, cubeSide, cubeSide], smooth_rad = smoothinRadius, $fn =
                100);
                translate([- blTouchAdapterWidth * .1, 0, smoothinRadius])
                    cube(size = [blTouchAdapterWidth * 1.8, cubeSide, cubeSide]);
                translate([- blTouchAdapterWidth * .1, - smoothinRadius, 0])
                    cube(size = [blTouchAdapterWidth * 1.8, cubeSide, cubeSide]);
                translate([blTouchAdapterWidth * 1.25, - blTouchAdapterTopWidth * 0.9, - blTouchAdapterBottomHeight])
                    cube(size = [blTouchAdapterTopWidth, blTouchAdapterDepth, blTouchAdapterHeight]);
                translate([- blTouchAdapterWidth * .2, - blTouchAdapterTopWidth * 0.9, - blTouchAdapterBottomHeight])
                    cube(size = [blTouchAdapterTopWidth, blTouchAdapterDepth, blTouchAdapterHeight]);
            }
}
